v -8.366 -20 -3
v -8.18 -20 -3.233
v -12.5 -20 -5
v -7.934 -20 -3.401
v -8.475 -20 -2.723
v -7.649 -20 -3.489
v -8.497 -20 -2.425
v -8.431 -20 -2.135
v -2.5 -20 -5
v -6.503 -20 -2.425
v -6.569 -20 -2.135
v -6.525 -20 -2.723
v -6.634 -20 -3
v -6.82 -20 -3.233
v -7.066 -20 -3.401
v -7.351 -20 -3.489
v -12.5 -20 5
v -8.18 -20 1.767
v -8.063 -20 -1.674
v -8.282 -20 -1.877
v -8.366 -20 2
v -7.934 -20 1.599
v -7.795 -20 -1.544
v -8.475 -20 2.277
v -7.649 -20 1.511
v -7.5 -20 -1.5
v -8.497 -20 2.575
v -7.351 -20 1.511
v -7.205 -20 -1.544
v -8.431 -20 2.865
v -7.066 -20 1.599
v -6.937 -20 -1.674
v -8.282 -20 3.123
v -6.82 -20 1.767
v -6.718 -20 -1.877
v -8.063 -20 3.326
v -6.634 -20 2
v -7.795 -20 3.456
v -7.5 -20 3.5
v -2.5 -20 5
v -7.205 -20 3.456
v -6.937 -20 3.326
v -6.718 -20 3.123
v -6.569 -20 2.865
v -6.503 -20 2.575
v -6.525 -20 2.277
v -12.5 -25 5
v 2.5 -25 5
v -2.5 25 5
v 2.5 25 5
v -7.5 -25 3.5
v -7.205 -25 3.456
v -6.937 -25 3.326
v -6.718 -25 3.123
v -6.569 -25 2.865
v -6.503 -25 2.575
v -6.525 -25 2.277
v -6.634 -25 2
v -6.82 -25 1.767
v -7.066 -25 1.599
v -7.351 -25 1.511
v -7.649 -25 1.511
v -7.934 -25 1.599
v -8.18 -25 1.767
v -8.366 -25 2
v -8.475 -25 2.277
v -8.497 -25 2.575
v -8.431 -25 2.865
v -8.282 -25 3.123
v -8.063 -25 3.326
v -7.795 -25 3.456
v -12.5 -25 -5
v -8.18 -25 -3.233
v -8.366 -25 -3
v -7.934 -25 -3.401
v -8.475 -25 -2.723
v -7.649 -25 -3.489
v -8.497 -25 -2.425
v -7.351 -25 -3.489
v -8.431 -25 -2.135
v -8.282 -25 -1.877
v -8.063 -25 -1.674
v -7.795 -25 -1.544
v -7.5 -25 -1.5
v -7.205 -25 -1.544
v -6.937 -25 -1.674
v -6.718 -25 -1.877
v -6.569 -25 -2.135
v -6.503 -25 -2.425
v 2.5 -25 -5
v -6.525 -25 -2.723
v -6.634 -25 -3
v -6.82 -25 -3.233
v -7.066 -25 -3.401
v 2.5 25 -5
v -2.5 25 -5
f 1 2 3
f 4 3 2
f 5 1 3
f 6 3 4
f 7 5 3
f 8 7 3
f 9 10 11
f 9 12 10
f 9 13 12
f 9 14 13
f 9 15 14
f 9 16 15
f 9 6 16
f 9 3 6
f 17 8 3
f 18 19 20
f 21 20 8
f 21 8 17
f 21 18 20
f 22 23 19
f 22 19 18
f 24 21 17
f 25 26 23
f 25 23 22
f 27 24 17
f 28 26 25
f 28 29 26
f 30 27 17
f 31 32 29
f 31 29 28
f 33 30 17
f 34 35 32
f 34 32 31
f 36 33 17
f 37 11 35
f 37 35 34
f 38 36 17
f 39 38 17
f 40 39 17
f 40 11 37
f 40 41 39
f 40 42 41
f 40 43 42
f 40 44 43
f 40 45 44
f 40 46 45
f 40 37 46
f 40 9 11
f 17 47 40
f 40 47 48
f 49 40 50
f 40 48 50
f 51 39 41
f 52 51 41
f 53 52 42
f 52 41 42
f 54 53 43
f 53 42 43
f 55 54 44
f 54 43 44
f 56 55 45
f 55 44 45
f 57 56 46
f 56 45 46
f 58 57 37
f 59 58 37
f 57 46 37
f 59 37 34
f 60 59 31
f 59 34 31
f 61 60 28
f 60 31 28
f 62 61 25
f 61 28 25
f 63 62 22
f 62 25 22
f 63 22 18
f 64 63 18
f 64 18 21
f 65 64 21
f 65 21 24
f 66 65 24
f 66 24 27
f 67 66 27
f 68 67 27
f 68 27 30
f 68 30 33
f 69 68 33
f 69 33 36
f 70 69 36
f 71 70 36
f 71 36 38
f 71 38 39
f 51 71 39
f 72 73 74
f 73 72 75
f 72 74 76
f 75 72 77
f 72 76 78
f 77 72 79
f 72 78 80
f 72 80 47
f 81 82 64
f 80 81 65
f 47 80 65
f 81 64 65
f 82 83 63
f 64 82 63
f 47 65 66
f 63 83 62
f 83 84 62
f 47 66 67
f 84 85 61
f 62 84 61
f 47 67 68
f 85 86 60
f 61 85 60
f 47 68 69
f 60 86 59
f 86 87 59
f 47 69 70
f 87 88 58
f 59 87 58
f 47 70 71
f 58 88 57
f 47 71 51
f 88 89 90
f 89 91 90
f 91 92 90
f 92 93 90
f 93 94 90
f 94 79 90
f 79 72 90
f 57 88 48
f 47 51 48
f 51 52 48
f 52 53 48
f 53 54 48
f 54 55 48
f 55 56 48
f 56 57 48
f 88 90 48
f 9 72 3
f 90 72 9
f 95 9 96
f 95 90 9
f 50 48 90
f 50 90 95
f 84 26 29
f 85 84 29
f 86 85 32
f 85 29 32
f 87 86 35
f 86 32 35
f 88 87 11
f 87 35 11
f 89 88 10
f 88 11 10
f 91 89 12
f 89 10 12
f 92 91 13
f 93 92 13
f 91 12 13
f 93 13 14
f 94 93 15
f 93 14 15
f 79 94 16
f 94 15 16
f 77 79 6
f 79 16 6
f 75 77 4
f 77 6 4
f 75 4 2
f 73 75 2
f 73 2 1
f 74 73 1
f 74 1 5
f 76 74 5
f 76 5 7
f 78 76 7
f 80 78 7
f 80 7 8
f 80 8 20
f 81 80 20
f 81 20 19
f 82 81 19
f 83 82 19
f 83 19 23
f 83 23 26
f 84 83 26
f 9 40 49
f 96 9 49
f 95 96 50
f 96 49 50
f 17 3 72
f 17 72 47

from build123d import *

# Parameters (mm, degrees)
SKETCH1_W           = 5
SKETCH1_H           = 50
BOSS_EXTRUDE1_DEPTH = 5
SKETCH2_W           = 10
SKETCH2_H           = 5
BOSS_EXTRUDE2_DEPTH = 10
SKETCH3_R           = 1
CUT_EXTRUDE1_DEPTH  = 47.97073557


with BuildPart() as part:
    # Sketch1 → Boss-Extrude1 (new, symmetric)
    with BuildSketch(Plane.XY):
        Rectangle(SKETCH1_W, SKETCH1_H)
    extrude(amount=BOSS_EXTRUDE1_DEPTH, both=True)

    # Sketch2 → Boss-Extrude2 (add)
    with BuildSketch(Plane.ZY.offset(2.5)):
        with Locations((0, -22.5)):
            Rectangle(SKETCH2_W, SKETCH2_H)
    extrude(amount=BOSS_EXTRUDE2_DEPTH)

    # Sketch3 → Cut-Extrude1 (cut, through all)
    with BuildSketch(Plane(origin=(0, -20, 0), x_dir=(1, 0, 0), z_dir=(0, 1, 0))):
        with Locations(Location((-7.5, 2.5, 0), (0, 0, 270))):
            Circle(SKETCH3_R)
        with Locations(Location((-7.5, -2.5, 0), (0, 0, 270))):
            Circle(SKETCH3_R)
    extrude(amount=-CUT_EXTRUDE1_DEPTH, mode=Mode.SUBTRACT)


solid = part.part
